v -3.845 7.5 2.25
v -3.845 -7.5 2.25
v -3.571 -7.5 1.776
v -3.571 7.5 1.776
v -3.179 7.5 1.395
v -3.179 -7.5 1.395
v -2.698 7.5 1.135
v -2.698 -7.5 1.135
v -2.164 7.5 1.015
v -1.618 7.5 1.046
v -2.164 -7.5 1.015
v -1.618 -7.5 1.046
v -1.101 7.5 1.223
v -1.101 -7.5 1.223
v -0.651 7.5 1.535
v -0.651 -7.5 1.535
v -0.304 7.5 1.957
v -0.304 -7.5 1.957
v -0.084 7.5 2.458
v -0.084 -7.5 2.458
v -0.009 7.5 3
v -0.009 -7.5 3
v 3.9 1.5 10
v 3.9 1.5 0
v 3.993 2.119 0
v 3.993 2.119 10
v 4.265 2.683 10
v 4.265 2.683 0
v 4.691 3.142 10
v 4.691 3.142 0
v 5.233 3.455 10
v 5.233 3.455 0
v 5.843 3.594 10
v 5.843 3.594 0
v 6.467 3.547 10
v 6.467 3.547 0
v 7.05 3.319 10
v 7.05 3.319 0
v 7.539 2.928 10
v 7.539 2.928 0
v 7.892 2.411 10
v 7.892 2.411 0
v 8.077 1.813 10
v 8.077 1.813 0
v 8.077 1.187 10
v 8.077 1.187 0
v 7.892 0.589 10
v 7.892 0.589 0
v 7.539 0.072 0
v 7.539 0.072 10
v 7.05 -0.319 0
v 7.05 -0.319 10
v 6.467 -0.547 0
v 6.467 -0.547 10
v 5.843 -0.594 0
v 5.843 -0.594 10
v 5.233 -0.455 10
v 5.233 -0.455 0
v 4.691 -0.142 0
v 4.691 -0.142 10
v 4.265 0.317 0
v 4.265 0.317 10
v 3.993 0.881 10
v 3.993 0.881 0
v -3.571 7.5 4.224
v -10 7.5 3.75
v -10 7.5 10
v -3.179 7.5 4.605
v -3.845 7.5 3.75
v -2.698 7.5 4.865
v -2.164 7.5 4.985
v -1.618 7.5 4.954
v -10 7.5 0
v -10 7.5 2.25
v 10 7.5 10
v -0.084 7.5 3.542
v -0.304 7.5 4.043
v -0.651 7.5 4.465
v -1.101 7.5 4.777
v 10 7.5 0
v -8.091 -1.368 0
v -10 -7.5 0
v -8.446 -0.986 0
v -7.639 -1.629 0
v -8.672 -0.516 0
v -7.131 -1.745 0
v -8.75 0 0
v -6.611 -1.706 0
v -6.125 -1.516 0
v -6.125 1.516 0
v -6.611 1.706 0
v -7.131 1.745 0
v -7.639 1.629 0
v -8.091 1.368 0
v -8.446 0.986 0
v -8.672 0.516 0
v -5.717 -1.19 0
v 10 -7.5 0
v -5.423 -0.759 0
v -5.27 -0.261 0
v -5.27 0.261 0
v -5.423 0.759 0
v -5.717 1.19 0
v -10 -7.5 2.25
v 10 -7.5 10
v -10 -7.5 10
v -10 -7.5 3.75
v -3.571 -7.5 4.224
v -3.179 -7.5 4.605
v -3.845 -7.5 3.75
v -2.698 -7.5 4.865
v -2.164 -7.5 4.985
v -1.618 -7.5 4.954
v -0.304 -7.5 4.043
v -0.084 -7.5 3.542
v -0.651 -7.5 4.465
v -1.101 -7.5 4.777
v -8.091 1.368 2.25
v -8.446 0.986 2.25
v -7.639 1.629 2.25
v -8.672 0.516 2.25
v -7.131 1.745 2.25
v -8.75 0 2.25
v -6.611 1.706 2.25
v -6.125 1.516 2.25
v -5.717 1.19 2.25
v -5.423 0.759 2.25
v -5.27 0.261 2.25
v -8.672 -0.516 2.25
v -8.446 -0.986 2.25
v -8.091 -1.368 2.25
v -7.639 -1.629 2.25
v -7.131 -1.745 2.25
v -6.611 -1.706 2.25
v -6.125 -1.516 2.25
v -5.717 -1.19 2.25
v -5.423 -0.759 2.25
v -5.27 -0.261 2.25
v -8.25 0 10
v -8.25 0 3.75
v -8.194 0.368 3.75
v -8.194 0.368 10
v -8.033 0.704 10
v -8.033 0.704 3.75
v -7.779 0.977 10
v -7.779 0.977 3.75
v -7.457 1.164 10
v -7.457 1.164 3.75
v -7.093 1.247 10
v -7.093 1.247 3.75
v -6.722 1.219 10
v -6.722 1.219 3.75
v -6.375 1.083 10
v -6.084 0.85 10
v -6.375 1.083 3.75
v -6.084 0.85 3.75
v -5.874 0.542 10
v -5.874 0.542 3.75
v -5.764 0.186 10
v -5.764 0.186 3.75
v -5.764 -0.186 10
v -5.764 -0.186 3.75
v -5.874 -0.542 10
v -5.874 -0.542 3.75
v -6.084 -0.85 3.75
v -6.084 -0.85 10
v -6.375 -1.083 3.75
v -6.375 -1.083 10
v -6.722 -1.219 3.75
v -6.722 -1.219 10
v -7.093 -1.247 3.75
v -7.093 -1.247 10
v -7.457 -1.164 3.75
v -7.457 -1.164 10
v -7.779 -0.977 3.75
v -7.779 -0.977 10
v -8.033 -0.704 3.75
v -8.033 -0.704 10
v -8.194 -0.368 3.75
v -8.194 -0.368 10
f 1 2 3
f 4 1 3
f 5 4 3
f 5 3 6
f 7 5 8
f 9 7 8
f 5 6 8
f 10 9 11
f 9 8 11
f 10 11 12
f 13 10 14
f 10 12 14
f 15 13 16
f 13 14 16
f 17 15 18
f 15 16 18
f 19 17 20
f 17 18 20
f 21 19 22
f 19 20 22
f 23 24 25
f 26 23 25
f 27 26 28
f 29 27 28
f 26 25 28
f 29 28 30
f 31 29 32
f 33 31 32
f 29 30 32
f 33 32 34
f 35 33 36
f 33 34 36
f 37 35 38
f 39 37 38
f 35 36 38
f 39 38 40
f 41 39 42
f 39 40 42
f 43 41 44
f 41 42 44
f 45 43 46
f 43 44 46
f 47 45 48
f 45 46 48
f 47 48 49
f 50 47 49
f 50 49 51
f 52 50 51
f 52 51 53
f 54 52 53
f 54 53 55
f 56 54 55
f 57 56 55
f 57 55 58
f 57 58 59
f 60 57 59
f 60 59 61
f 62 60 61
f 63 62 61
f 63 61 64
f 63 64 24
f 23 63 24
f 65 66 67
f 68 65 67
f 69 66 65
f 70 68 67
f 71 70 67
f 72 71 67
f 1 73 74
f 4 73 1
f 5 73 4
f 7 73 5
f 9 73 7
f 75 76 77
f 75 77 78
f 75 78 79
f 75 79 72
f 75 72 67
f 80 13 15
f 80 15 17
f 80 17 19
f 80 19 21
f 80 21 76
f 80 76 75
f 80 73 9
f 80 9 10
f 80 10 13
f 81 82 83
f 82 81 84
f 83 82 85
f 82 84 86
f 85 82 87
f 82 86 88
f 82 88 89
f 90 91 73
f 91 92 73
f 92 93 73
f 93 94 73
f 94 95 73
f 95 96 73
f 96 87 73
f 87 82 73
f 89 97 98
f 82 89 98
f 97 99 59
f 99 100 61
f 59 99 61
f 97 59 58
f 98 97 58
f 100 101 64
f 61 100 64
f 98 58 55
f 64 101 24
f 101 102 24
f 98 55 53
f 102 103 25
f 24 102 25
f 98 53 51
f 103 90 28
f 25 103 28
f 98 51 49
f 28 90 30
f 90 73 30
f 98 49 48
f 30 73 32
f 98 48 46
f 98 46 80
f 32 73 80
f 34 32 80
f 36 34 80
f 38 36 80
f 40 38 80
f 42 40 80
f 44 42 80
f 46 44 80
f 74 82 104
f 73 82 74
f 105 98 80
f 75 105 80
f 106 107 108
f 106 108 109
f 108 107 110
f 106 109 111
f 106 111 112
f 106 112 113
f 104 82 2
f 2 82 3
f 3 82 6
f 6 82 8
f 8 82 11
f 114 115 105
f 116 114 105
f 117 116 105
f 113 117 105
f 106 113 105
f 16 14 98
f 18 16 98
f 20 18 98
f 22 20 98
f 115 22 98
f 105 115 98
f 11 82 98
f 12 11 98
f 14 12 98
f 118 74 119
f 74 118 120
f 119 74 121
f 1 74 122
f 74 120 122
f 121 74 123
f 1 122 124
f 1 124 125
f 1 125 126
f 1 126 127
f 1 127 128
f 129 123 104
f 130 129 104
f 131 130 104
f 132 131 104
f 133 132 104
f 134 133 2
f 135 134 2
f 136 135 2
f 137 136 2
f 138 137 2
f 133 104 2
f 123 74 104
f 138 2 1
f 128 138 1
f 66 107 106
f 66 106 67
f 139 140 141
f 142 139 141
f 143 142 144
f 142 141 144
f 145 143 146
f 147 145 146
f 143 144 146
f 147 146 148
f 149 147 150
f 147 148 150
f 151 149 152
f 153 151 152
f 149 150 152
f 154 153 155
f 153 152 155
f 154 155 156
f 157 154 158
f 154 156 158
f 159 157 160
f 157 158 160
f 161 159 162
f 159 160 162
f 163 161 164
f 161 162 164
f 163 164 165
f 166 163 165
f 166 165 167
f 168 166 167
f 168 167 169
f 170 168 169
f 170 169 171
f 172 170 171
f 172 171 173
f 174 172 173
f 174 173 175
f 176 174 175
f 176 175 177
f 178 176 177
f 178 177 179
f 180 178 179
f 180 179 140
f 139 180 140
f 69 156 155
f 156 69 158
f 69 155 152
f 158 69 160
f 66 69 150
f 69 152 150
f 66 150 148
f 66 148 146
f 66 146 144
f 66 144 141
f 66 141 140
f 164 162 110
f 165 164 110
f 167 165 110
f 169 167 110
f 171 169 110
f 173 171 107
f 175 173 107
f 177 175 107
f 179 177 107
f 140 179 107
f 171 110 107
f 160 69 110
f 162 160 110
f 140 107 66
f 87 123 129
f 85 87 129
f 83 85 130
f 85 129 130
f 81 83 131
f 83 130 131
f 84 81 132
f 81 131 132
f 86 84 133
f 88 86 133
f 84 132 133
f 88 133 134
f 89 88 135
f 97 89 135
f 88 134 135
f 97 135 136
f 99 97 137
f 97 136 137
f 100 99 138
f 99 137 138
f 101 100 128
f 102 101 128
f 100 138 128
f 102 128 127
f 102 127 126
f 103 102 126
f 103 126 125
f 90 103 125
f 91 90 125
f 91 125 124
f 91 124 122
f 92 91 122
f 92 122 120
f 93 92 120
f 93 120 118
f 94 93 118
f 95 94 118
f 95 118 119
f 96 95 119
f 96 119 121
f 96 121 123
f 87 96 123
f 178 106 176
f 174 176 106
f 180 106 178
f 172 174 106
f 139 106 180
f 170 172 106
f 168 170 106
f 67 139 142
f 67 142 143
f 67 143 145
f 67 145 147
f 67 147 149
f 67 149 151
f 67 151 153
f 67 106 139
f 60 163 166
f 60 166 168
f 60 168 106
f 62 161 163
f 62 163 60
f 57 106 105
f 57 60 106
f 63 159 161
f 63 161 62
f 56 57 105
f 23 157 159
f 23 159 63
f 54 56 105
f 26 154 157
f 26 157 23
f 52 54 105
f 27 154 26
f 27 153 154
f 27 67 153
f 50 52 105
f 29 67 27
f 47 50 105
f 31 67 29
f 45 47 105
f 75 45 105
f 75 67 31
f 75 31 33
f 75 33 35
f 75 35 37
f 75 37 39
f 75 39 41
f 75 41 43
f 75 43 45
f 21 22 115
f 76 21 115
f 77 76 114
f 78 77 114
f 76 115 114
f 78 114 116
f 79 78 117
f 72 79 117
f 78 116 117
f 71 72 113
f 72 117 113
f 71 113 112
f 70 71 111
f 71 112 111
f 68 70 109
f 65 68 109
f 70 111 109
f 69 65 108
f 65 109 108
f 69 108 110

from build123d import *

# Parameters (mm, degrees)
F0_W     = 20
F0_H     = 15
F1_DEPTH = 10
F3_D     = 4.2
F5_DEPTH = 15.001
F7_D     = 3.5
F7_DEPTH = 3
F7_TIP   = 1.0515060833
F9_D     = 2.5


with BuildPart() as f1:
    # F0 (on Top) → F1 (new body)
    with BuildSketch(Plane.XY):
        Rectangle(F0_W, F0_H)
    extrude(amount=F1_DEPTH)

    # F3 (through all)
    with Locations(Plane.XY.offset(10)):
        with Locations((6, 1.5)):
            Hole(F3_D / 2)

    # F4 (on face) → F5 (cut, through all)
    with BuildSketch(Plane.XZ.offset(7.5)):
        with BuildLine():
            ThreePointArc((-3.8446359594, 2.25), (-1.6178994152, 1.0457275099), (-0.0087235695, 3))
            ThreePointArc((-0.0087235695, 3), (-1.6178994152, 4.9542724901), (-3.8446359594, 3.75))
            ThreePointArc((-3.8446359594, 3.75), (-3.9912764305, 3), (-3.8446359594, 2.25))
        make_face()
        with BuildLine():
            ThreePointArc((-3.8446359594, 2.25), (-3.9912764305, 3), (-3.8446359594, 3.75))
            Line((-3.8446359594, 3.75), (-10, 3.75))
            Line((-10, 3.75), (-10, 2.25))
            Line((-10, 2.25), (-3.8446359594, 2.25))
        make_face()
    extrude(amount=-F5_DEPTH, mode=Mode.SUBTRACT)

    # F7
    with Locations(Plane(origin=(0, 0, 0), x_dir=(1, 0, 0), z_dir=(0, 0, -1))):
        with Locations((-7, 0)):
            Hole(F7_D / 2, depth=F7_DEPTH)
            with Locations((0, 0, -(F7_DEPTH + F7_TIP / 2))):  # 118° drill point
                Cone(0, F7_D / 2, F7_TIP, mode=Mode.SUBTRACT)

    # F9 (through all)
    with Locations(Plane.XY.offset(10)):
        with Locations((-7, 0)):
            Hole(F9_D / 2)


solid = f1.part
